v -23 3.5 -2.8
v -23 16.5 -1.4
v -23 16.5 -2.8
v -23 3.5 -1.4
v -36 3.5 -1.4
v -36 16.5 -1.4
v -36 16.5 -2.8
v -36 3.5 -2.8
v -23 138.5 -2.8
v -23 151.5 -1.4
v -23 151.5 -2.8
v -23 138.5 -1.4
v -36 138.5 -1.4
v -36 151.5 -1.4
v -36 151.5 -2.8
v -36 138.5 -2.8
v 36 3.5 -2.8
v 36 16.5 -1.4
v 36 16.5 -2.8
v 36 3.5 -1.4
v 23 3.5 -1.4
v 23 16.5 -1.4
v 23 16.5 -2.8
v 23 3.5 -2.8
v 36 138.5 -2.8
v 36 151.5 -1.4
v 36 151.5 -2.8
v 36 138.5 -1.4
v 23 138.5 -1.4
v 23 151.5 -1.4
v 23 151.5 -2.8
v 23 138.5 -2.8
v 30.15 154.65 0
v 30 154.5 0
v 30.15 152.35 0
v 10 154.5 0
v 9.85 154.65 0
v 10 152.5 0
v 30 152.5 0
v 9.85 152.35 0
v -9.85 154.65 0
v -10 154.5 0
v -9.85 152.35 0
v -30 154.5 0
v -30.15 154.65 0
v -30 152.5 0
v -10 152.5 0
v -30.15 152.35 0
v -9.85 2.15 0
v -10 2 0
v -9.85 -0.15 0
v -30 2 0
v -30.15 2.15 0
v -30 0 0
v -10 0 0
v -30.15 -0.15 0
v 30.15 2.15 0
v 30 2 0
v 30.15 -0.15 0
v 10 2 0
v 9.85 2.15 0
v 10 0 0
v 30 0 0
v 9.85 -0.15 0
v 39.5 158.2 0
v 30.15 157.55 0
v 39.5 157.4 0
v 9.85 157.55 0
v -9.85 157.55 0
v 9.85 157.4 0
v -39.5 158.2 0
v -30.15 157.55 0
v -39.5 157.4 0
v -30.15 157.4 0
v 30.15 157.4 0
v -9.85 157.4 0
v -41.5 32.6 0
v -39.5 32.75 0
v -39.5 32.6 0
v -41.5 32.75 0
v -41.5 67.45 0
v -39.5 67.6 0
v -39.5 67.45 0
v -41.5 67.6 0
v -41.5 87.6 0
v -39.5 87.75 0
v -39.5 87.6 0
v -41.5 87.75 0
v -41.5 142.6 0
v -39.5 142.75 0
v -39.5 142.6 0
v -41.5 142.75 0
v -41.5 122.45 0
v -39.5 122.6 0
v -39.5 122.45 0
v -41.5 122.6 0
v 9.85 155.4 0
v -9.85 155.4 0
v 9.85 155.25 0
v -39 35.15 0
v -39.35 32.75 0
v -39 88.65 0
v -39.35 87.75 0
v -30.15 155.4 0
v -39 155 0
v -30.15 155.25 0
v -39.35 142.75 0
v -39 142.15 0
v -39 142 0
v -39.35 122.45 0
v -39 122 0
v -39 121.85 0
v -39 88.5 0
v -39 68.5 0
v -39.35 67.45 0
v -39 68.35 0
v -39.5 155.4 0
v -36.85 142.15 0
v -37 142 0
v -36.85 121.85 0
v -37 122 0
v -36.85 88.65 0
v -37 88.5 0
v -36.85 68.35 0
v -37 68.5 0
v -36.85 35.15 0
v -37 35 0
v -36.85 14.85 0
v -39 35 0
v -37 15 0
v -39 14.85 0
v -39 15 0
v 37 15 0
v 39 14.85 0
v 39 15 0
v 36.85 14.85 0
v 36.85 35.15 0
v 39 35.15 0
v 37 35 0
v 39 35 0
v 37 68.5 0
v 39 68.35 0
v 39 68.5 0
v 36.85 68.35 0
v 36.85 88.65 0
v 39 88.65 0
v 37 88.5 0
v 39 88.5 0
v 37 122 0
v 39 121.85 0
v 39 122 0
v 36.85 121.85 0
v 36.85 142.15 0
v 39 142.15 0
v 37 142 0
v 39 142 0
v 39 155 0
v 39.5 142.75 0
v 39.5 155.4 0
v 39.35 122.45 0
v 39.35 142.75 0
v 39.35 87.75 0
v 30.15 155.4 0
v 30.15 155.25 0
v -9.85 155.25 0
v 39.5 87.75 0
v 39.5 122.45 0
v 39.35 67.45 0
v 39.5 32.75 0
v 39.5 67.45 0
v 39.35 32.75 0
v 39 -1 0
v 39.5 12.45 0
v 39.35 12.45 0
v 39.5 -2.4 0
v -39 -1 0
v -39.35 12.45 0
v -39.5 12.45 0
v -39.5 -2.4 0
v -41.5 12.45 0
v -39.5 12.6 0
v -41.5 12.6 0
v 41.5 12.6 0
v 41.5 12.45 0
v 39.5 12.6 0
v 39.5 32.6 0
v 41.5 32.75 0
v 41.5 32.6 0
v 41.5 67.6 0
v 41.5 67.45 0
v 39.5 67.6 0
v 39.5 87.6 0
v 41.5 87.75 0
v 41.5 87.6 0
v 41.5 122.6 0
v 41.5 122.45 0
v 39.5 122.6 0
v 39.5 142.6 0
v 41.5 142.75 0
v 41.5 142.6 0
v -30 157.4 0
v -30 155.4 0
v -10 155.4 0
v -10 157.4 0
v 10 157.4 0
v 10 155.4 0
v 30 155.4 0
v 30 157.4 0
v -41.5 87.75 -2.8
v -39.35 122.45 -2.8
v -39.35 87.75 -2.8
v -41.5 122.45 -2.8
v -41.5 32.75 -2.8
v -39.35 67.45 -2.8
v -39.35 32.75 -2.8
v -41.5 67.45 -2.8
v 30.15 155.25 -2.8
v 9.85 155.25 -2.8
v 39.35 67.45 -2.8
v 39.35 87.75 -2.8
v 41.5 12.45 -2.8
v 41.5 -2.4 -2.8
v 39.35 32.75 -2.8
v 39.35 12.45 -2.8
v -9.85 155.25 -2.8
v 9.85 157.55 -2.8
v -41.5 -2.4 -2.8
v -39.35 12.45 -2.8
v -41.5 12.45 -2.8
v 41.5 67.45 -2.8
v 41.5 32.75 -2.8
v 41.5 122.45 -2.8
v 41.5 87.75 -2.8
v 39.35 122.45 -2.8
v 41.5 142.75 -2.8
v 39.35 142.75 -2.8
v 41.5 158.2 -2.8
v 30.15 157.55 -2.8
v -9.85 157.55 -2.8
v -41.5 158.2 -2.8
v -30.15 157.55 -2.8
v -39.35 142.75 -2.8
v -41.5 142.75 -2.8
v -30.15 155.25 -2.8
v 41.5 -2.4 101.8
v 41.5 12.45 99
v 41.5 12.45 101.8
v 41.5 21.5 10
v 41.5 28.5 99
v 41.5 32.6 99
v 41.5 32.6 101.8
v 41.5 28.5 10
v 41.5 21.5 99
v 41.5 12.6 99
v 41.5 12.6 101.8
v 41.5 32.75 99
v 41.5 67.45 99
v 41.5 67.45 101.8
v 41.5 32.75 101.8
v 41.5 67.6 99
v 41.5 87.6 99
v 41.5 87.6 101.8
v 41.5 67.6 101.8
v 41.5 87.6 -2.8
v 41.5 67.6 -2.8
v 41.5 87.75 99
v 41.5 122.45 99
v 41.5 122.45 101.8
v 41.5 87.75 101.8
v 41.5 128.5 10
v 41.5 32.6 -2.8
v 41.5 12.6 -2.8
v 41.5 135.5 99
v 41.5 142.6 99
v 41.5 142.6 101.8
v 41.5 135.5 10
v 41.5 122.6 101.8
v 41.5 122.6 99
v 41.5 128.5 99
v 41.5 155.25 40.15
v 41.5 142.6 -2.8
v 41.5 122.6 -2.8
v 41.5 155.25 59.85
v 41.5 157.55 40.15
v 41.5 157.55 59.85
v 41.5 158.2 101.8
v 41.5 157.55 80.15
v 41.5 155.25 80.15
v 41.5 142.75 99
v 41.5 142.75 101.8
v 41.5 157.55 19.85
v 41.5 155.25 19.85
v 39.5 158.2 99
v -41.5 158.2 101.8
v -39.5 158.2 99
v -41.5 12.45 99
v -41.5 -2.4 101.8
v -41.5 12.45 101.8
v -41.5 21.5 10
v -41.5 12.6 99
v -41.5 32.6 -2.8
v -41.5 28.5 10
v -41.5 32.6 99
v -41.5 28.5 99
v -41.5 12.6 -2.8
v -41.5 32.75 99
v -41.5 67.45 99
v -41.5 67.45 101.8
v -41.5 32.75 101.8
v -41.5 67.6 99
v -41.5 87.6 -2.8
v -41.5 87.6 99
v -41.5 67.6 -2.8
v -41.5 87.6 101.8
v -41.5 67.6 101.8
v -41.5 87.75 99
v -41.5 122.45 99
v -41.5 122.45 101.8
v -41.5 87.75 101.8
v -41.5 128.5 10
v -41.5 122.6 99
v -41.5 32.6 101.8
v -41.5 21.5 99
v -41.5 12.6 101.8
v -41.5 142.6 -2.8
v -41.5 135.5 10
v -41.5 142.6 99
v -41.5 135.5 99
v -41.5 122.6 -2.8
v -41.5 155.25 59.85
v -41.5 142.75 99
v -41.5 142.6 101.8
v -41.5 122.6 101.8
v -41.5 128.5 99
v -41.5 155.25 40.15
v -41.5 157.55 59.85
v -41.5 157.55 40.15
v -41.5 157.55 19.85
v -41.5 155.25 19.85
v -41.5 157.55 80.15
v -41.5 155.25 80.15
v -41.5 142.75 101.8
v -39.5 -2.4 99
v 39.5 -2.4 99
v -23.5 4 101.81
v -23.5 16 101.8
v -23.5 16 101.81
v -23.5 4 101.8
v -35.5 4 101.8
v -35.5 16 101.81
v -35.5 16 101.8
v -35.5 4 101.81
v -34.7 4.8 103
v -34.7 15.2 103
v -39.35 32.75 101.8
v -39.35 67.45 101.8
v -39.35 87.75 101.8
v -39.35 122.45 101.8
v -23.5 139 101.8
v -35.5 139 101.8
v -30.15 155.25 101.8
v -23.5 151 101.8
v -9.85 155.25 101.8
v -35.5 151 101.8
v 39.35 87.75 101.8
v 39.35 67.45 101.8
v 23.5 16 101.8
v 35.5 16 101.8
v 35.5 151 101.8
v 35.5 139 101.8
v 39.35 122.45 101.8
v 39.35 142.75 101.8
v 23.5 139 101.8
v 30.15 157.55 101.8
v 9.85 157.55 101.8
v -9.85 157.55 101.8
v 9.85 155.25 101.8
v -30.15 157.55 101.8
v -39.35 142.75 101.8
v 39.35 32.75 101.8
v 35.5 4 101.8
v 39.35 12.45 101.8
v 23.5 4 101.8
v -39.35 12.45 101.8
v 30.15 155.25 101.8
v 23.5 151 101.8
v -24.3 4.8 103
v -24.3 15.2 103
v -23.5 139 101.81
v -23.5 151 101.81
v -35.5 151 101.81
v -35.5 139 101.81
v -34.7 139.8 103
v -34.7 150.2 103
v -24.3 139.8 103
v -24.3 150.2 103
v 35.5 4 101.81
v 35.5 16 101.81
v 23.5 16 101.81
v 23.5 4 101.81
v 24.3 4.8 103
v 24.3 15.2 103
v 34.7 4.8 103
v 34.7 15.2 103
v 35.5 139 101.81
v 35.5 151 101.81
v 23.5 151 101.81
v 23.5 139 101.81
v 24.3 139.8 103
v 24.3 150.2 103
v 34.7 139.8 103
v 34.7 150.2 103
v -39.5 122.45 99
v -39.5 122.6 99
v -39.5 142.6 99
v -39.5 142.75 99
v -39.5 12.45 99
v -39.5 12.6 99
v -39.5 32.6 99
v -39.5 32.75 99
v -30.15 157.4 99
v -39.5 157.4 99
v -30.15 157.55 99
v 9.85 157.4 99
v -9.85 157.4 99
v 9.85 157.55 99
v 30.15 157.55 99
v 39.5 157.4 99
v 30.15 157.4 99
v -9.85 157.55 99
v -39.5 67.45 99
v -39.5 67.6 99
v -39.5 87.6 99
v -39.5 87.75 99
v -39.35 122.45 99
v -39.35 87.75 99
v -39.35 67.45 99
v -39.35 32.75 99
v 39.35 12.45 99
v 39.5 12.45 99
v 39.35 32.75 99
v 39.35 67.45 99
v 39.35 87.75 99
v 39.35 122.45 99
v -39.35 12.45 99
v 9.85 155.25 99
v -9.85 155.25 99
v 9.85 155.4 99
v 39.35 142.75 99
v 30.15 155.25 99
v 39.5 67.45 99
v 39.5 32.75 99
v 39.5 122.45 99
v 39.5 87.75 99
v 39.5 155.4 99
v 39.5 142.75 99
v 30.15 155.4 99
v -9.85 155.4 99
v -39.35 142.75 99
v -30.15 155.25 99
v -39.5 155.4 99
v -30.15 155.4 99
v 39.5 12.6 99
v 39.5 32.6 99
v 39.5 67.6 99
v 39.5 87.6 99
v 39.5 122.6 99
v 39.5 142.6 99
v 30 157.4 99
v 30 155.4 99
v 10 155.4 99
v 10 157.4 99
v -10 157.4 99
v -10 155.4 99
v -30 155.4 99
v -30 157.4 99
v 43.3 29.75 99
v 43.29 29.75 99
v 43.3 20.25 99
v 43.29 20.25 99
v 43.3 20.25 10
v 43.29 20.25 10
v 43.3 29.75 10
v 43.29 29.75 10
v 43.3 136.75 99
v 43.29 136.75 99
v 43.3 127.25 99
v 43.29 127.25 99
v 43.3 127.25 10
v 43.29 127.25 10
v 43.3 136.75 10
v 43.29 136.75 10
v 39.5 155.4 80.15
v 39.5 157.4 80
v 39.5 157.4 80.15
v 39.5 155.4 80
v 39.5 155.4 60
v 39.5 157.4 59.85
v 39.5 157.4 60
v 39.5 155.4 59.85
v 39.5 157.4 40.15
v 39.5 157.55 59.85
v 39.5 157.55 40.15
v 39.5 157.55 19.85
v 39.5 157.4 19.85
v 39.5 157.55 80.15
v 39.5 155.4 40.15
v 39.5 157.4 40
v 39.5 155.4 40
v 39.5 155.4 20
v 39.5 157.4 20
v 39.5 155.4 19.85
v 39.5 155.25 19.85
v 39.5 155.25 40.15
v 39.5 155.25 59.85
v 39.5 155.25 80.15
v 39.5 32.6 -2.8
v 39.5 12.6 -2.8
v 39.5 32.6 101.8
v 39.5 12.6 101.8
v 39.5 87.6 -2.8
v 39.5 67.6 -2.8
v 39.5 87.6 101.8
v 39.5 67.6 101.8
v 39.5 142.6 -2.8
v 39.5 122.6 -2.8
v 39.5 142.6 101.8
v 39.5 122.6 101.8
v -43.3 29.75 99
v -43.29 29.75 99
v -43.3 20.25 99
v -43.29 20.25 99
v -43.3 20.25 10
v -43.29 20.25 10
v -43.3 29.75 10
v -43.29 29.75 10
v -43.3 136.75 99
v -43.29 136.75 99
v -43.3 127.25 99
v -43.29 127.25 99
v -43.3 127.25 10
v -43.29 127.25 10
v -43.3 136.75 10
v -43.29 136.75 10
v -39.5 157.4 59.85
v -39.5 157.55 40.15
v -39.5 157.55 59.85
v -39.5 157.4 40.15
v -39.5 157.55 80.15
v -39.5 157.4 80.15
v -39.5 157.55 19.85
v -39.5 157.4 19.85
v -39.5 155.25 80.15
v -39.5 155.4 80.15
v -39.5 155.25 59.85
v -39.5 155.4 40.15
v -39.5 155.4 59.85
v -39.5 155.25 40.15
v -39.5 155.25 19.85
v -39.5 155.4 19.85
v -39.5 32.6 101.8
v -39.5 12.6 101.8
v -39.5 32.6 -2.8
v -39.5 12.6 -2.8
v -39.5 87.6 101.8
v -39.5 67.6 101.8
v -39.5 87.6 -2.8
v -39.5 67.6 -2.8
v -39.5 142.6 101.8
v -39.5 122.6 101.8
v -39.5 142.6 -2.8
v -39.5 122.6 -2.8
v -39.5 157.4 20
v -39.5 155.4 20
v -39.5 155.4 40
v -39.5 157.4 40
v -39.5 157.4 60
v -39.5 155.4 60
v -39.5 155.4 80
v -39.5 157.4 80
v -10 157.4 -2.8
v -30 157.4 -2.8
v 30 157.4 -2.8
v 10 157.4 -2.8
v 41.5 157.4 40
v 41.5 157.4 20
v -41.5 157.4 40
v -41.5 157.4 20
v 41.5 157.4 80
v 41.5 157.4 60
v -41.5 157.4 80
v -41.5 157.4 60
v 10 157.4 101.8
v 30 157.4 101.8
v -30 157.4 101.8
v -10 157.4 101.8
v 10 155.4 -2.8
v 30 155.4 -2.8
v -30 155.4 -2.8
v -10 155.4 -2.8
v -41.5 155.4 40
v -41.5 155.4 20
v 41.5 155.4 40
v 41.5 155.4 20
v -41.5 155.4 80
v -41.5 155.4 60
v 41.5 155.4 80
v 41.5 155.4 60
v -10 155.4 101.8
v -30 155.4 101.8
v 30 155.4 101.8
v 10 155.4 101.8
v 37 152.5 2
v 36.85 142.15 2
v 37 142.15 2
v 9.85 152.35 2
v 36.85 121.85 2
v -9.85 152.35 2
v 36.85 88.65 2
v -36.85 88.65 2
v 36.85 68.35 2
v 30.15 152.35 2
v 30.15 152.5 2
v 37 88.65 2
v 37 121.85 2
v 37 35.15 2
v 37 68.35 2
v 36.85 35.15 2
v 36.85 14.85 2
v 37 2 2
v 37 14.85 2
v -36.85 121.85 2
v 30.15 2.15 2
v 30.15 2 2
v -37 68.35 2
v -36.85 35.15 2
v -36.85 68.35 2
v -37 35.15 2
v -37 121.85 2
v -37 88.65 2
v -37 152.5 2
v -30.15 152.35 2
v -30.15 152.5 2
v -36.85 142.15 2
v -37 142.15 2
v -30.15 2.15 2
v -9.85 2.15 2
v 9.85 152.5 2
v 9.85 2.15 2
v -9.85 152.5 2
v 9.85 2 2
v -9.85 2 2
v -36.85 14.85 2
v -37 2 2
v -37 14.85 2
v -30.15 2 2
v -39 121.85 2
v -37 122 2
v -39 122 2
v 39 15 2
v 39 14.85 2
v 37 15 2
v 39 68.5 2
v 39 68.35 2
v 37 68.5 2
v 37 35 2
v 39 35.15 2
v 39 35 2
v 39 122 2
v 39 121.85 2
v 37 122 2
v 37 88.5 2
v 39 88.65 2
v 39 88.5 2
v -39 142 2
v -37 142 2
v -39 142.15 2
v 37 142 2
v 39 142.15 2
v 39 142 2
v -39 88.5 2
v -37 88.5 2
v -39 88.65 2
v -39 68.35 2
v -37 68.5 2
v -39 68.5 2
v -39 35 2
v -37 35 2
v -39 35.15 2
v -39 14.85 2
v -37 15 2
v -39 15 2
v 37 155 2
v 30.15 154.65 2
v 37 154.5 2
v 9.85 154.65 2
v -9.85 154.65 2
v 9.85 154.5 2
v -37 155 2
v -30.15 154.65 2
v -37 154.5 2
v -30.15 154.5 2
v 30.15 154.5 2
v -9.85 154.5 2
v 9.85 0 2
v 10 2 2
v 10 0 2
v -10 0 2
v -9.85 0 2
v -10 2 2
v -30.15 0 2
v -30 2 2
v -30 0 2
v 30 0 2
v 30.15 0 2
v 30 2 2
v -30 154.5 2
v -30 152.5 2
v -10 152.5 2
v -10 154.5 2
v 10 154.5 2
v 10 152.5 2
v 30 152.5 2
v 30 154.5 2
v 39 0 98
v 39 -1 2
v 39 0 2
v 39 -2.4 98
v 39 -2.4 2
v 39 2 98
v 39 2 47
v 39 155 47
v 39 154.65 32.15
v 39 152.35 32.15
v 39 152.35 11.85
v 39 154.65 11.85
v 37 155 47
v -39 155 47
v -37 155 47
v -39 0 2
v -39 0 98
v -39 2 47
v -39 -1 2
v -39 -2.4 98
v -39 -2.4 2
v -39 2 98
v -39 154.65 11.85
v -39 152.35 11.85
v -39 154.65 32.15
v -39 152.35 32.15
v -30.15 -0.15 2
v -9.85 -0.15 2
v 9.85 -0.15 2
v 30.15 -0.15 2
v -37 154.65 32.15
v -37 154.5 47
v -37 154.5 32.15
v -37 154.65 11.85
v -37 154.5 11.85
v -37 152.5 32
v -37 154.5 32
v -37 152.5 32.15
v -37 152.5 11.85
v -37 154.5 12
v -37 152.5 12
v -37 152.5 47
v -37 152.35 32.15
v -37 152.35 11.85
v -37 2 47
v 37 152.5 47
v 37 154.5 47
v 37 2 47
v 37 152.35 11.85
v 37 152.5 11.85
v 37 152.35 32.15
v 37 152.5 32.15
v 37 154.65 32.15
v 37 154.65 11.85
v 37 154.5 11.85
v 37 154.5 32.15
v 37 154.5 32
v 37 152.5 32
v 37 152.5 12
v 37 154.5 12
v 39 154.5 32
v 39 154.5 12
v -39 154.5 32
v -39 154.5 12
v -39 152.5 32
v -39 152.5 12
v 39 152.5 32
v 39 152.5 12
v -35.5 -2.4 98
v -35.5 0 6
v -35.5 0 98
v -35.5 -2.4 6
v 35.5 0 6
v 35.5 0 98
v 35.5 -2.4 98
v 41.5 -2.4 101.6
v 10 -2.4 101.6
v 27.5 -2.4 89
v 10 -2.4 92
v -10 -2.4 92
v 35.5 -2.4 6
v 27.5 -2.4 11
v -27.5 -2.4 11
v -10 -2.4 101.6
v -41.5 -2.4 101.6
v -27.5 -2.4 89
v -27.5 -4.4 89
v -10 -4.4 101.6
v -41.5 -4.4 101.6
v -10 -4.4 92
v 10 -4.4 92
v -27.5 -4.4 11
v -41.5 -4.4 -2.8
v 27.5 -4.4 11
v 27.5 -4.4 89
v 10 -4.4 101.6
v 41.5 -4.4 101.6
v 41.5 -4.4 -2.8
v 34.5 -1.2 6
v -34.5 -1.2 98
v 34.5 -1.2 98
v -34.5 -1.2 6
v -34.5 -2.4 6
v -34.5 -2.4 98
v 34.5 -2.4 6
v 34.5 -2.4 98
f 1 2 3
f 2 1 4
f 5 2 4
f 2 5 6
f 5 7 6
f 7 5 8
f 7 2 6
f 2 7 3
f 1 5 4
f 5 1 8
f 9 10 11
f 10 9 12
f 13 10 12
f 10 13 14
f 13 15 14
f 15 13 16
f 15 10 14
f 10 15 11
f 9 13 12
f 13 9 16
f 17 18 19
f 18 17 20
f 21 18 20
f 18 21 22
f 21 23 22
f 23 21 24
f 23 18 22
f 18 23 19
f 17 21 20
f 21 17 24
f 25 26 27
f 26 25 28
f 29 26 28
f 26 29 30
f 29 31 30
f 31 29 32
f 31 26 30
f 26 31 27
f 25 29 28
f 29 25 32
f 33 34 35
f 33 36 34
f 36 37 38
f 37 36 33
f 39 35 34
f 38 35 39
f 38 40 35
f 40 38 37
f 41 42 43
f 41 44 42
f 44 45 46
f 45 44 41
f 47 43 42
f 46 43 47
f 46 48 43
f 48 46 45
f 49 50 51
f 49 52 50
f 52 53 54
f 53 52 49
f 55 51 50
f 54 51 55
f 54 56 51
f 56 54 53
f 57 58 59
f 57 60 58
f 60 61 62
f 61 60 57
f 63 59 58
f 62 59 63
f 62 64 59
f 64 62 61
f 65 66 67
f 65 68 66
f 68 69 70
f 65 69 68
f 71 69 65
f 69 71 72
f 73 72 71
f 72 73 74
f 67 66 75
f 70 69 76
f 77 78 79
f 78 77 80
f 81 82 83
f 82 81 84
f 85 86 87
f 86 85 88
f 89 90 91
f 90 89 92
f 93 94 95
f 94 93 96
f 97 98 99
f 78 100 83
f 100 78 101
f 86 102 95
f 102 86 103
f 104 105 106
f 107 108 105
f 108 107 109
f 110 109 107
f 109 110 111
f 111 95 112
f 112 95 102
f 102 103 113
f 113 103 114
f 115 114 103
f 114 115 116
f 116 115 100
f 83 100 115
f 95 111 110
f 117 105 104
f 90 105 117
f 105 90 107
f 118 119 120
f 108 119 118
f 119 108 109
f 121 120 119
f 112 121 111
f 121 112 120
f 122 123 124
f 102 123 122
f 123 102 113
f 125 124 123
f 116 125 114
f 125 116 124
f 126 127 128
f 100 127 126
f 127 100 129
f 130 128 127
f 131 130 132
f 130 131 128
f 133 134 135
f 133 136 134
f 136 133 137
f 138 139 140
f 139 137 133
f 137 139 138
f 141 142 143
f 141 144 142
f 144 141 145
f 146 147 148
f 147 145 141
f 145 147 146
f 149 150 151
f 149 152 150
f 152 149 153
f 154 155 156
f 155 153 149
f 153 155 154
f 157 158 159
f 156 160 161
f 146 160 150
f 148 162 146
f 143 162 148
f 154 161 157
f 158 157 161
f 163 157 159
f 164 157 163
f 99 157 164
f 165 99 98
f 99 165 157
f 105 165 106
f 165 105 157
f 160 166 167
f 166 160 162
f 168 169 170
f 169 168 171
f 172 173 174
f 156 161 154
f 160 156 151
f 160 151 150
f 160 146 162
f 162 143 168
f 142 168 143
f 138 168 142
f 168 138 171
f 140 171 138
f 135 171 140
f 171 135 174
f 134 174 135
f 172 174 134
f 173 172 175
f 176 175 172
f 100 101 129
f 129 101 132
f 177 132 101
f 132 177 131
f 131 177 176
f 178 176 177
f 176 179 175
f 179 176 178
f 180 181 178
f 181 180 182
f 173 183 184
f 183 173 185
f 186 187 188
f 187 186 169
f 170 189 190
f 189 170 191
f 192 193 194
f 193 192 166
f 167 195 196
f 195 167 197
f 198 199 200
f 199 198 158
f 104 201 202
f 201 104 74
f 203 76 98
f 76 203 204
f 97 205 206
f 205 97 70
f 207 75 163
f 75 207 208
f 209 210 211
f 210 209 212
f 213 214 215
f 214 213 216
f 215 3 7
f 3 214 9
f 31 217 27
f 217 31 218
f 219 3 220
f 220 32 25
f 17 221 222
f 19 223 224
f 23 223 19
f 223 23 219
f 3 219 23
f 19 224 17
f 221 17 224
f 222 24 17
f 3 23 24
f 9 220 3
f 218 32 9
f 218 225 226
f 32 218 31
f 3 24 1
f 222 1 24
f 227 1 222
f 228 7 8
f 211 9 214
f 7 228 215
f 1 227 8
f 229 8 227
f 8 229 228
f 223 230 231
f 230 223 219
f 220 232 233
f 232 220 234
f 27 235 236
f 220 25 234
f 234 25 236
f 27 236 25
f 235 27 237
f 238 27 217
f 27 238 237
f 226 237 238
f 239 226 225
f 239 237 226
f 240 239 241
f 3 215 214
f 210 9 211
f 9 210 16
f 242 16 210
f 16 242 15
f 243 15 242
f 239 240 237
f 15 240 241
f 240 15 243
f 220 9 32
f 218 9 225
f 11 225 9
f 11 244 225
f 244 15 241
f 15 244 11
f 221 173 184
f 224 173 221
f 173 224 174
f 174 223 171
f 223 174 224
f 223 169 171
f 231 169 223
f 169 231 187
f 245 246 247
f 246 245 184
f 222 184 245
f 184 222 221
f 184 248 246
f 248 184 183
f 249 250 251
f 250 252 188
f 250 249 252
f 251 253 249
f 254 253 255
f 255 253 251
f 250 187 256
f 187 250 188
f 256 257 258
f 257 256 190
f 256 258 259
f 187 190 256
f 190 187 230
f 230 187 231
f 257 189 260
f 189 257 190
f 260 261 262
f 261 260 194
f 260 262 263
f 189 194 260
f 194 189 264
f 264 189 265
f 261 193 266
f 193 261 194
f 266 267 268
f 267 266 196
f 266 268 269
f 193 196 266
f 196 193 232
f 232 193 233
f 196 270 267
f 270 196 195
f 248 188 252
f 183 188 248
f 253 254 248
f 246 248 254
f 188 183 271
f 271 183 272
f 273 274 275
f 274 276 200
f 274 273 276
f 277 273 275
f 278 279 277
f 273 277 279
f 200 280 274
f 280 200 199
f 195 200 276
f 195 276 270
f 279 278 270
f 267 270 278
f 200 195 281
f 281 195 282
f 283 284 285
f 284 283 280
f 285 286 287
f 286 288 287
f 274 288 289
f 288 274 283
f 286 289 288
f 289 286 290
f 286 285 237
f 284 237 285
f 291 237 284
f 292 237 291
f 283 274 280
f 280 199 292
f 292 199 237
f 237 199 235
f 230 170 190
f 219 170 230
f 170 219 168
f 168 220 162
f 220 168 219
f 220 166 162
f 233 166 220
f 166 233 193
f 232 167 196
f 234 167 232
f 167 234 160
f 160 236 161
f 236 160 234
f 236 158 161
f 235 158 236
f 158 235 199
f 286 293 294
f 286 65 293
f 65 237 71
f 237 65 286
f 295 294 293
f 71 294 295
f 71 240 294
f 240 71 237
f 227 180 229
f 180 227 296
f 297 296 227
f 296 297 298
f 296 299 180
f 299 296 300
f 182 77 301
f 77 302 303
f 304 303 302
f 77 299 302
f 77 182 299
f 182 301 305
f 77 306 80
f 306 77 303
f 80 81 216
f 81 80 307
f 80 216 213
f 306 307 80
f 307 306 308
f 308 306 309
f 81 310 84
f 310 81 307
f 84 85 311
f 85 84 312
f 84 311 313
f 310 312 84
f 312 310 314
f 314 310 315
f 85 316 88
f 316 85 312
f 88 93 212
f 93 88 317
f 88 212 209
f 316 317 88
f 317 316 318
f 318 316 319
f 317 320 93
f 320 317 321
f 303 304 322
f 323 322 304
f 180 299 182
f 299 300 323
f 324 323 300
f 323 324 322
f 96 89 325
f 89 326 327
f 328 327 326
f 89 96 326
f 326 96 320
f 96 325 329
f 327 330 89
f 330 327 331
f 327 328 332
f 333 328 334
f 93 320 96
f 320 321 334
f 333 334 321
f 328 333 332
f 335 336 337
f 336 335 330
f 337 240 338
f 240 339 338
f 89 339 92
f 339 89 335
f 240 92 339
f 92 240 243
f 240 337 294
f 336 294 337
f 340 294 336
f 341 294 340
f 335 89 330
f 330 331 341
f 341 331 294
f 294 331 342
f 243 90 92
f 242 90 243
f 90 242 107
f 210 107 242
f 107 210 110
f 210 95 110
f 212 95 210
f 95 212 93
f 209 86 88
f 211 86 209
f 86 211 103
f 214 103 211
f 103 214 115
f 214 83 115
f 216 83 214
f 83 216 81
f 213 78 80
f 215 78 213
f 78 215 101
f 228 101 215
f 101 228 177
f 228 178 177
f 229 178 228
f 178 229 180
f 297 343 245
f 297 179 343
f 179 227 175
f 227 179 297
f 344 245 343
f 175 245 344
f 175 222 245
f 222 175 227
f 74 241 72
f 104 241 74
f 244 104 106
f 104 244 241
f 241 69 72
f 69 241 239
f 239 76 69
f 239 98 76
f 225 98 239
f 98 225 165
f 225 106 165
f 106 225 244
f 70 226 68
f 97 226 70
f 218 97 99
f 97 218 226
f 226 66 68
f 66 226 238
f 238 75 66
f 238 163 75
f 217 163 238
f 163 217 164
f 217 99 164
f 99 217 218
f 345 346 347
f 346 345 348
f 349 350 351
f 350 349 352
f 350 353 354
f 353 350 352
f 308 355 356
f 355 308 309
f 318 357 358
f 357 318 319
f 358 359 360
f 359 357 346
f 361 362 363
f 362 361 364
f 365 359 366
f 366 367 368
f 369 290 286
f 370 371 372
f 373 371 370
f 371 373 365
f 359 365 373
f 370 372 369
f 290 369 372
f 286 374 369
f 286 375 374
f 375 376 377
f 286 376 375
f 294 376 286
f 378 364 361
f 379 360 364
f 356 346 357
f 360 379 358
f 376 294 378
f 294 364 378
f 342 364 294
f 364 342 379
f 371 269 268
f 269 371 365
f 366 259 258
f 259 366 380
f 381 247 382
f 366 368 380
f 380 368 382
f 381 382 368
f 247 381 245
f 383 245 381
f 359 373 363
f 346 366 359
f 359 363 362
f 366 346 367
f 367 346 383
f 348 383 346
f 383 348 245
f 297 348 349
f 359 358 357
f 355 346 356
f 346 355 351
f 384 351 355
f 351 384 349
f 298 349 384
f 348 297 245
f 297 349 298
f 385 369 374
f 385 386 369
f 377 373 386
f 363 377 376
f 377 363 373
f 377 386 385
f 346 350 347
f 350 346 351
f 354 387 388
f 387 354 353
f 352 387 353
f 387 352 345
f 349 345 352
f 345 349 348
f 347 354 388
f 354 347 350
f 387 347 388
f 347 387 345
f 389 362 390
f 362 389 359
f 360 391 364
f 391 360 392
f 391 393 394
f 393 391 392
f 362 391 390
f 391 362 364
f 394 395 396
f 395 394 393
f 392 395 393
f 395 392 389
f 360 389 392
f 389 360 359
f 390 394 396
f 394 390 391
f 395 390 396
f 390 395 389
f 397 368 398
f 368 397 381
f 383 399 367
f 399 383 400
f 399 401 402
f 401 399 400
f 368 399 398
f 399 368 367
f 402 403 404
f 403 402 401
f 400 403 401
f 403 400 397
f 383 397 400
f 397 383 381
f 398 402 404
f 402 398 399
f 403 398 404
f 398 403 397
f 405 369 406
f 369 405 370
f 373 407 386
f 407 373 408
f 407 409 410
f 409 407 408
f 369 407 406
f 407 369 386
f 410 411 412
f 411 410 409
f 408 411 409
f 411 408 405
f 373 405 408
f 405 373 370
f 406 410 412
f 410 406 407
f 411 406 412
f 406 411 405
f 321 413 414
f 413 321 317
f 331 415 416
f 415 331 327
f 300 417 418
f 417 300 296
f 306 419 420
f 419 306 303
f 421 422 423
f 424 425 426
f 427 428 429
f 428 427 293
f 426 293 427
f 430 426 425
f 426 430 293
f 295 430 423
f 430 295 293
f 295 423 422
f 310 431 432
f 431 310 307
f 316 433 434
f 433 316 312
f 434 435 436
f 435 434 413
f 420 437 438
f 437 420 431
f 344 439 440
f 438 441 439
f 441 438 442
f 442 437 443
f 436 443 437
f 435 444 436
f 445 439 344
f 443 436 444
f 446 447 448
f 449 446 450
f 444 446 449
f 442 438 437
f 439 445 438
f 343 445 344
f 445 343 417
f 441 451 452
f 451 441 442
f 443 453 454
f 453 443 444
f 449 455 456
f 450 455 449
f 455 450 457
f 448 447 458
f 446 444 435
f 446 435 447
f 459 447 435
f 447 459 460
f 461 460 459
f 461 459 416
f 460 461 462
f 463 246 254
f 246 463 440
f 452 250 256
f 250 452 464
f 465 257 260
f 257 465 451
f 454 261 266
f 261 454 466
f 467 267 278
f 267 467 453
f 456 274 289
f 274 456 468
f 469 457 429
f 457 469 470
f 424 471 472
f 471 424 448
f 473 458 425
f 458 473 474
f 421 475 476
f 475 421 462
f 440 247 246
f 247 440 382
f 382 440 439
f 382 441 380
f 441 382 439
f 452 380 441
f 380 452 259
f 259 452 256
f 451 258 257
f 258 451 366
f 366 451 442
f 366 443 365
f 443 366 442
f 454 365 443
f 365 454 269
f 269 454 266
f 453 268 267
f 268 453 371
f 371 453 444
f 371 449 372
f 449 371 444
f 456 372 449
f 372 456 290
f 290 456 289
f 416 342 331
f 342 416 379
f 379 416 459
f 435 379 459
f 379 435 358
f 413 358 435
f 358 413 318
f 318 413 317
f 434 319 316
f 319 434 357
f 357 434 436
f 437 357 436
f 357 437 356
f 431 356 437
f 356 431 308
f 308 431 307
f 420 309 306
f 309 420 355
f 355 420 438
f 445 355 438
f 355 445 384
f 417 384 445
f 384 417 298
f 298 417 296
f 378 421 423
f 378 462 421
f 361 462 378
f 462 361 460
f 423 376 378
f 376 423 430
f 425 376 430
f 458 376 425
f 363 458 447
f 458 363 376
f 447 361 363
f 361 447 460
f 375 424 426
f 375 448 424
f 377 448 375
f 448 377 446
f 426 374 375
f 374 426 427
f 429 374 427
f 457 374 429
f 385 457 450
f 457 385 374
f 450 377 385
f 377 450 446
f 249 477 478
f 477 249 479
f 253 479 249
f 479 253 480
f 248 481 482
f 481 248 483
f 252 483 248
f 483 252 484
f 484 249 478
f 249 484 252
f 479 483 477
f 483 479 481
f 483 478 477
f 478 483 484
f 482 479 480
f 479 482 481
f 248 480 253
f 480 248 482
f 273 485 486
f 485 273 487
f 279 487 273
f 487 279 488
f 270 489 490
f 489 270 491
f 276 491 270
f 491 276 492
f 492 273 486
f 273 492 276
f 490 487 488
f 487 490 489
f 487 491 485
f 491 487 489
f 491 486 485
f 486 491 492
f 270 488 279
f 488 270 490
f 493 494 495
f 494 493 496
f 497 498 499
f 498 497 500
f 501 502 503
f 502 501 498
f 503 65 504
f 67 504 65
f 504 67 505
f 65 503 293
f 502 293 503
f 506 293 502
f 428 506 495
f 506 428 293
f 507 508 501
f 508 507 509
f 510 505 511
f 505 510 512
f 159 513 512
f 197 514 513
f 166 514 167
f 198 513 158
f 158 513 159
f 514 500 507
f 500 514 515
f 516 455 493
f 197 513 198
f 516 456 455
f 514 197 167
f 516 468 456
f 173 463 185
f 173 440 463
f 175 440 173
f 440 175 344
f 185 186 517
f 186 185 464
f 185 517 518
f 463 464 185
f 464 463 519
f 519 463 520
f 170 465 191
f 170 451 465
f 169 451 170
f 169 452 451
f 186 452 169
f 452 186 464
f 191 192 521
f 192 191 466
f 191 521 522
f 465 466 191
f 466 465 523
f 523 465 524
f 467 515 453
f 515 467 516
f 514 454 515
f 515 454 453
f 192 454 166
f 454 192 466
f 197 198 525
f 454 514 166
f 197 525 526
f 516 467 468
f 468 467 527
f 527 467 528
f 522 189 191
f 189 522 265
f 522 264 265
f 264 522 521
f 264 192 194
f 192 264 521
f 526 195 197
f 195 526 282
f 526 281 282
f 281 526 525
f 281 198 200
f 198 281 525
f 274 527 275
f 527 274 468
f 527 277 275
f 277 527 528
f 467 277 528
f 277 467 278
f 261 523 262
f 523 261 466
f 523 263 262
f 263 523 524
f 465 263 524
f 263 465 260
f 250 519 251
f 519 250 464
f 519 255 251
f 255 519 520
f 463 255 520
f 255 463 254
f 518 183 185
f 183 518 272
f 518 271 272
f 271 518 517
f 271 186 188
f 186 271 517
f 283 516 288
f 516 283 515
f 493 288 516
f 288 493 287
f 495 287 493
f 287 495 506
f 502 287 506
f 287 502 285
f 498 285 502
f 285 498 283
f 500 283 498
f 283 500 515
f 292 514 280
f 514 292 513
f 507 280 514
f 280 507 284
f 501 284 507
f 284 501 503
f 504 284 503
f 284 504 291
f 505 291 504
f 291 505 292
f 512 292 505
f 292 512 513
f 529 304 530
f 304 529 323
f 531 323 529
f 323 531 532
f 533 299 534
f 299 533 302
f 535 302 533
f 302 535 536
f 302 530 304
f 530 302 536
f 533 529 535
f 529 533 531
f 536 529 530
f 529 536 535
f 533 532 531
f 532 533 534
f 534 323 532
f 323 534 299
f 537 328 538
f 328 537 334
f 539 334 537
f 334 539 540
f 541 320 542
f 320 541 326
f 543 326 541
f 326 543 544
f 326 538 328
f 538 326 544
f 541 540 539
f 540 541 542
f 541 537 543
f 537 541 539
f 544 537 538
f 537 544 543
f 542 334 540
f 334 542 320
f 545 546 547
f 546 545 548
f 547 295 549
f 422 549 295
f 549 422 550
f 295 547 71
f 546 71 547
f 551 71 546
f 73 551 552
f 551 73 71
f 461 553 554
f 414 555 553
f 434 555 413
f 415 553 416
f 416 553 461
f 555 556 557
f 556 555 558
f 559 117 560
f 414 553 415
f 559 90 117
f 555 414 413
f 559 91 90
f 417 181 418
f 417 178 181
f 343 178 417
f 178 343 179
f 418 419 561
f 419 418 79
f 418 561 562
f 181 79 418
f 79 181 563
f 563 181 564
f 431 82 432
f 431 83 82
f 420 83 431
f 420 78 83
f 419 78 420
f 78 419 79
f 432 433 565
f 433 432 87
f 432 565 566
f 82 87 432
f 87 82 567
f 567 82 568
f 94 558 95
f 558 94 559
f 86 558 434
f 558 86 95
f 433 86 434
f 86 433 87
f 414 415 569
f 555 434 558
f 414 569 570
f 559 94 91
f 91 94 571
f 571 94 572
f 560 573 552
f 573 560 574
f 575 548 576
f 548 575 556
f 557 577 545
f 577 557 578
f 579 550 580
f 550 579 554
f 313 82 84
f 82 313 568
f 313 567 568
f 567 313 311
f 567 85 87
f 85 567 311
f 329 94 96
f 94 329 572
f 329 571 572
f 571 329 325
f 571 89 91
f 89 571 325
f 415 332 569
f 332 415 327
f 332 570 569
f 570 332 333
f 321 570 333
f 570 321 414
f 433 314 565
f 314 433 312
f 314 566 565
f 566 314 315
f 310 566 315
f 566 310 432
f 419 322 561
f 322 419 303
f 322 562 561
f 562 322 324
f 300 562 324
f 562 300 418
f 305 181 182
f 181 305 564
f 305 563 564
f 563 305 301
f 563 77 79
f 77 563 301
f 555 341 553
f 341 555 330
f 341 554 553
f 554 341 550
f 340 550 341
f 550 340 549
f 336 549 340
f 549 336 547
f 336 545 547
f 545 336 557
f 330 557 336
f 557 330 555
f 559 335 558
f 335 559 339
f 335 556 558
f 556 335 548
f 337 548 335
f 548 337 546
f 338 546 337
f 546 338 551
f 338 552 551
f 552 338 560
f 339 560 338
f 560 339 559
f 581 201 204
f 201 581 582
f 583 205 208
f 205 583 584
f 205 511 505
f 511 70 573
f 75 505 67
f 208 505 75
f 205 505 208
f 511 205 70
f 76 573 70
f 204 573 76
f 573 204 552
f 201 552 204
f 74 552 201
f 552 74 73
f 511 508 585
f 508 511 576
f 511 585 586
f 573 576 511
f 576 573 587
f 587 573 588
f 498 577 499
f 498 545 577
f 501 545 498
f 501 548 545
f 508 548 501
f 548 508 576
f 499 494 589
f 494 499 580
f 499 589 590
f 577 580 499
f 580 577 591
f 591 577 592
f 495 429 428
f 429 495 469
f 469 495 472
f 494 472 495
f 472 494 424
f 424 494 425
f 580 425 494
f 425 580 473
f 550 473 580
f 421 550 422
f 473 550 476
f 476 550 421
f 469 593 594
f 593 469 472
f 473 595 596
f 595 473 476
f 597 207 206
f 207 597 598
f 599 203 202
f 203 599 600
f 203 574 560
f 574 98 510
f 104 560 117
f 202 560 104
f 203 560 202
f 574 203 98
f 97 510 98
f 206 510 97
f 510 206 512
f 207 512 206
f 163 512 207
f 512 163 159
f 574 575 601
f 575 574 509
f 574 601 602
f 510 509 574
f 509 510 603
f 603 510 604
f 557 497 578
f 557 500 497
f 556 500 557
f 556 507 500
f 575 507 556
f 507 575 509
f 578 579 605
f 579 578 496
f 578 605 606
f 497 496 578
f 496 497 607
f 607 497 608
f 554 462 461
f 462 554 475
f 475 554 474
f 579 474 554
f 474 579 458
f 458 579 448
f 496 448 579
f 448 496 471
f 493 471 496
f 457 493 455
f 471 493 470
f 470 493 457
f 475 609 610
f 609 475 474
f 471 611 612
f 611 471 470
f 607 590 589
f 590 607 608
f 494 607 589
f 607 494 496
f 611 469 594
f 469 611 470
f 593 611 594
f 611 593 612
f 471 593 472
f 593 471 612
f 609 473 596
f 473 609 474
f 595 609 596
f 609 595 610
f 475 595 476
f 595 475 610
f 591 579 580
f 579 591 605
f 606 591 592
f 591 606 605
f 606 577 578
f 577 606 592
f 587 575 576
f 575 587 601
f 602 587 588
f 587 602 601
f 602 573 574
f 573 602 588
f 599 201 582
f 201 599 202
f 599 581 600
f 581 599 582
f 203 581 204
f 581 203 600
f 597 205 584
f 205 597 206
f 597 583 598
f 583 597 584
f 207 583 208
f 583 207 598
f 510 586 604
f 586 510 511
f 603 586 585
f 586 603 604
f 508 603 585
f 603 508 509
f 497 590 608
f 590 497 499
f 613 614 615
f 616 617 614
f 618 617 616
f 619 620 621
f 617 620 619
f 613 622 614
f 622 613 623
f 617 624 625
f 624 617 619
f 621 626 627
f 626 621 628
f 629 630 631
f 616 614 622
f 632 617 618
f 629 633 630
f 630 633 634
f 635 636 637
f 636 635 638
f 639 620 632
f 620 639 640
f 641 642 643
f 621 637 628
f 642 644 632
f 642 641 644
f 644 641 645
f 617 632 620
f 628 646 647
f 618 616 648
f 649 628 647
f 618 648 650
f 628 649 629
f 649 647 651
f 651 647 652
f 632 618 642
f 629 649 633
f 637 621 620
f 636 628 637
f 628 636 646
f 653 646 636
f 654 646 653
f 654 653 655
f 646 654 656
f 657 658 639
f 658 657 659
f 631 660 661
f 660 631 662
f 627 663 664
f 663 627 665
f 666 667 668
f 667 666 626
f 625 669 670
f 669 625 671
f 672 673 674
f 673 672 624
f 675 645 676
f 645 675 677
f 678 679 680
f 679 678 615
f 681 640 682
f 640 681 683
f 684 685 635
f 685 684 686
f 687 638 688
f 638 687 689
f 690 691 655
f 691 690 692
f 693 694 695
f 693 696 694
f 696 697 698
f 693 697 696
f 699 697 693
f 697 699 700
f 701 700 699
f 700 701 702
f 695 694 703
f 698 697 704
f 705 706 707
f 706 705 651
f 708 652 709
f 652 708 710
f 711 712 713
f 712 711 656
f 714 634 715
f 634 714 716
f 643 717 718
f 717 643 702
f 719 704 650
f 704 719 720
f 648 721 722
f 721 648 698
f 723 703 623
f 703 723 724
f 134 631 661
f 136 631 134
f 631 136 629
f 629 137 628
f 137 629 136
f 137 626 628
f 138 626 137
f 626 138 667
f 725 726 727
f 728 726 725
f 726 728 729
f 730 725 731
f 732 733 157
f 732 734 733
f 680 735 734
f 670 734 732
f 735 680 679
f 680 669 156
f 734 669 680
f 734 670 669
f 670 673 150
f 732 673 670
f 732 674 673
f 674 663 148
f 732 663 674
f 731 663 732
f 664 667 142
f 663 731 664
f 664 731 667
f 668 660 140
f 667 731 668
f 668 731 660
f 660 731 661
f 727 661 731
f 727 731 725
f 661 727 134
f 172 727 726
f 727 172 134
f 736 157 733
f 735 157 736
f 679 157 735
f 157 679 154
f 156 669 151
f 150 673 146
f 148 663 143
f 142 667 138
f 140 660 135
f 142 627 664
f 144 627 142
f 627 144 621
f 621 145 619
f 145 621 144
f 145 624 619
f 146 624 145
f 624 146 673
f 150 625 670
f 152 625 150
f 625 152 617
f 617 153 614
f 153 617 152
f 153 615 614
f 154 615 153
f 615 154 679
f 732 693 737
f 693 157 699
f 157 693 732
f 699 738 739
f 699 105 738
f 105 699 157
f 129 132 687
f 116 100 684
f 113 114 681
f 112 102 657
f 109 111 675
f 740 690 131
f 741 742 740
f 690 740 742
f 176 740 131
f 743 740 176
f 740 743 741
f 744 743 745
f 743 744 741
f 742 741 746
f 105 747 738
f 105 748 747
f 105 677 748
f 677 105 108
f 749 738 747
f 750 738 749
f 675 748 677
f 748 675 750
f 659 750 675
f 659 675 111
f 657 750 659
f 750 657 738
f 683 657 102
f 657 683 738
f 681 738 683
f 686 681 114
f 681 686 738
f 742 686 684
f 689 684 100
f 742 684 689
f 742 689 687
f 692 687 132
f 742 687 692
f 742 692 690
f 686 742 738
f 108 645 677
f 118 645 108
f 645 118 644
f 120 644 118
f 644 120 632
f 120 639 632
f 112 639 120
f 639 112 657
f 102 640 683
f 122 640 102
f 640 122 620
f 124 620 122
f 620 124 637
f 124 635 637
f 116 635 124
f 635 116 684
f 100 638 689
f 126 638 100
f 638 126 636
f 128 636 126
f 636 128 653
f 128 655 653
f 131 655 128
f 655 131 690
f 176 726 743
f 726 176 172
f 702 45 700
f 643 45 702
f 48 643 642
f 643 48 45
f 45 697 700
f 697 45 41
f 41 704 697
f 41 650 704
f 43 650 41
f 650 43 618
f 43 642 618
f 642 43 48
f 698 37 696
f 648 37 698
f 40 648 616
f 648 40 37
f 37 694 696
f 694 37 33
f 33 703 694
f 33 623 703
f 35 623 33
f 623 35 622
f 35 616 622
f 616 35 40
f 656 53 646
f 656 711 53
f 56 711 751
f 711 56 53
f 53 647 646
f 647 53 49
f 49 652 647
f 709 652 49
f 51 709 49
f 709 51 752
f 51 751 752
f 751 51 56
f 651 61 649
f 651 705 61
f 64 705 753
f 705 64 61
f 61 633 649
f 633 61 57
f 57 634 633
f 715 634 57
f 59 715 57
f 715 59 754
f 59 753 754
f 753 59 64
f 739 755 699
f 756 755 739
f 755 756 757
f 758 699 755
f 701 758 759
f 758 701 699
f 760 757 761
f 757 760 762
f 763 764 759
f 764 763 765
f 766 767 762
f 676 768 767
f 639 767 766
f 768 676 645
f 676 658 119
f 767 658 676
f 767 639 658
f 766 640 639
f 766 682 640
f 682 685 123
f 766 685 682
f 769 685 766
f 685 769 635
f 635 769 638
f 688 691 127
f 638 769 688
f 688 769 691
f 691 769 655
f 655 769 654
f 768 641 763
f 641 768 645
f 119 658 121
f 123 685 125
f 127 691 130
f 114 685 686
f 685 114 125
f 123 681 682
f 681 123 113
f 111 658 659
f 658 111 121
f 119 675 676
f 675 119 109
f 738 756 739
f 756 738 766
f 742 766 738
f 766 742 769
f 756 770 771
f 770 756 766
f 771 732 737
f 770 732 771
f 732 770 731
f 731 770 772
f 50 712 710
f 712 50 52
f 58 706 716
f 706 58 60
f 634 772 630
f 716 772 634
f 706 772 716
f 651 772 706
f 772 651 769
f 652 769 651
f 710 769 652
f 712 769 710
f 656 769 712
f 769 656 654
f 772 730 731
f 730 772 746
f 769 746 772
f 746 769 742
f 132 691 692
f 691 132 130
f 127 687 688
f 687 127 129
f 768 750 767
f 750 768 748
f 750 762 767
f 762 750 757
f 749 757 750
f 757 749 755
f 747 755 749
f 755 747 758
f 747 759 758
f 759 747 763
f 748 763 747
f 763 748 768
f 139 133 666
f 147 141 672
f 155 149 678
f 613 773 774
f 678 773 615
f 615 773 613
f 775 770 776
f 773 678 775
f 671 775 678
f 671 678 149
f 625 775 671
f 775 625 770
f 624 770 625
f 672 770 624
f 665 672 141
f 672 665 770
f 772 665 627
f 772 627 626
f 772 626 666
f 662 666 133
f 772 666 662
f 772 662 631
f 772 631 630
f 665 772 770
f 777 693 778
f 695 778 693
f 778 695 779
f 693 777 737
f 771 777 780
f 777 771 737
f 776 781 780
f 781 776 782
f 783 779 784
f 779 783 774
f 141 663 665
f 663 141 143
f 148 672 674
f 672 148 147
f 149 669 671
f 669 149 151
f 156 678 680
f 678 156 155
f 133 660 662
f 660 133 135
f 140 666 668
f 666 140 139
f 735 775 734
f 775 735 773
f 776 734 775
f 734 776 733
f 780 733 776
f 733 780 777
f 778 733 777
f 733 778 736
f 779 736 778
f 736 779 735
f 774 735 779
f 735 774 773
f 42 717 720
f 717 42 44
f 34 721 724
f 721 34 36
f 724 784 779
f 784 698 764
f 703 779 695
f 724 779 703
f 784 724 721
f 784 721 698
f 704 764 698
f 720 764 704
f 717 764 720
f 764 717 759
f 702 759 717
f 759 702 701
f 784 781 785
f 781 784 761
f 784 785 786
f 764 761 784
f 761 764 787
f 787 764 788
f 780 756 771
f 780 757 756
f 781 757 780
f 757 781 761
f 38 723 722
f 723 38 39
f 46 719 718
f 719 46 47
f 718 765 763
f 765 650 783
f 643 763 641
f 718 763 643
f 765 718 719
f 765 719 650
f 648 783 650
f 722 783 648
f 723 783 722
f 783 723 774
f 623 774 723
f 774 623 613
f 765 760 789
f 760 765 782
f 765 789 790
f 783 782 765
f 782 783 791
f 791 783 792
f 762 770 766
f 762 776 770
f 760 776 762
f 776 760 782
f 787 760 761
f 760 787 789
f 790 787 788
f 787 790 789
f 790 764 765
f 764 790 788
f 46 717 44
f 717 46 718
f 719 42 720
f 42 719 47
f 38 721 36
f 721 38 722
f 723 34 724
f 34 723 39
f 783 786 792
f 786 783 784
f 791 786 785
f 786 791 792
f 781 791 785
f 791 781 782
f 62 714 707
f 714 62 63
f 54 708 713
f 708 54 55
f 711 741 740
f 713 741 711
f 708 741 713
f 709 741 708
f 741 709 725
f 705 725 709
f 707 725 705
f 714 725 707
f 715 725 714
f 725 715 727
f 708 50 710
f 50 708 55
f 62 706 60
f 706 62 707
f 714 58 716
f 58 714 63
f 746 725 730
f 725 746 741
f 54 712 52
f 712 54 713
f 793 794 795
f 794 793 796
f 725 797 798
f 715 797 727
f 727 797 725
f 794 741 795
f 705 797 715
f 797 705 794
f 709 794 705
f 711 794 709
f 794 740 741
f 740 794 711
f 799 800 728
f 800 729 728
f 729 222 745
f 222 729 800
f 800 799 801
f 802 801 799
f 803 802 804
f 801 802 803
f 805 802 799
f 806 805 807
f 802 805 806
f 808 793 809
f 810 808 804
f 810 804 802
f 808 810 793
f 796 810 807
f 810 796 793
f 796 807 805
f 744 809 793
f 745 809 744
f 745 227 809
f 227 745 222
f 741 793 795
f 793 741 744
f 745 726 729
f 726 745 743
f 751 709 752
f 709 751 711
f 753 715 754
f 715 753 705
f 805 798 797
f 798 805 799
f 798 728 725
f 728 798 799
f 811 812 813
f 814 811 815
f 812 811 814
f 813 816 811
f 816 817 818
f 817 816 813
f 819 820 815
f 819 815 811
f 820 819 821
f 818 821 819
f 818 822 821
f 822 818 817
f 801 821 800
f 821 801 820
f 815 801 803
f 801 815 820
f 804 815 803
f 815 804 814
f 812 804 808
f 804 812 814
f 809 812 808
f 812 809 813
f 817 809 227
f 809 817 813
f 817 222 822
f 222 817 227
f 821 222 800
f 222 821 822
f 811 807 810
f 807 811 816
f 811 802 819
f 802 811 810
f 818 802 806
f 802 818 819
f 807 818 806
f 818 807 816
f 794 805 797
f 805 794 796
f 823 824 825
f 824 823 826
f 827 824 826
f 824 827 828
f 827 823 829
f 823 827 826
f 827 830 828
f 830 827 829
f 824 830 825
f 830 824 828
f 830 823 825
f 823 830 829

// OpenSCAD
/*
 * Pokemon card drawer cabinet for the Bambu Lab A1 mini (180x180x180 mm).
 *
 * Every part is a flat plate printed lying on the build plate, so the
 * surfaces that touch cards get the build-plate finish (no layer ridges).
 * Plates join with friction-fit tabs and slots; the only glued joint is
 * the display frame onto the drawer's inner front plate.
 *
 * Units: mm.  Cards: 63x88 raw; the pocket clears double-sleeved cards
 * (about 70x95).
 *
 * Select the part to export with -D 'part="..."' (see Makefile), or set
 * `part` below.  "assembly" shows everything put together for preview.
 */

/* [Part selection] */
// assembly | drawer_bottom | drawer_side_left | drawer_side_right | drawer_back | drawer_front_inner | drawer_front_frame | window_pane | case_bottom | case_top | case_side_left | case_side_right | case_back | clip | follower | coupon_slot | coupon_tab | coupon_rail
part = "assembly";
// assembly preview only: how far the drawer is pulled out
pull = 0;

/* [Fit] */
// tab-to-slot clearance per side; print the coupons first to tune
fit = 0.15;
// drawer-to-case sliding clearance per side
slide = 0.5;

/* [Plates] */
// wall plate thickness
t = 2.0;
// case top/bottom plate thickness
tb = 2.8;

/* [Card space] */
// drawer inner width; double-sleeved cards (~70) plus finger room
pocket_w = 74;
// headroom above the drawer floor; double-sleeved height (~95) plus play
card_space = 96;
// length of the card row (sets capacity)
row_len = 150.5;
// drawer side/back wall height
wall_h = 45;

/* [Display pocket] */
// slot depth for pane + label card
disp_gap = 2.4;
pane_t = 1.2;
pane_w = 69;
pane_h = 92;
// window cutout in the frame
win_w = 55;
win_h = 78;
rib_w = 3.5;
// finger notch in the frame top edge
notch_w = 20;
notch_d = 9.6;

/* [Tabs] */
tab_l = 20;

/* [Stacking] */
nub = 12;
nub_h = 1.2;
rec_d = 1.4;

/* [Rails and clips] */
rail_base = 7;
rail_top = 9.5;
rail_h = 1.8;
rail_z0 = 10;
clip_leg = 42;
clip_bridge = 8;

/* [Hidden] */
// ---- derived: drawer ----
dbw = pocket_w + 2 * t;        // drawer bottom width (78)
dbl = row_len + 2 * t + 1.5;   // drawer bottom length (156): 1 front lip + 0.5 rear margin
side_y0 = 3;                   // drawer-local y where the side walls start
side_len = dbl - side_y0;      // 153
back_c = side_y0 + row_len + t / 2;   // back wall center y (154.5)
// ---- derived: case ----
ciw = dbw + 2 * slide;         // case inner width (79)
cow = ciw + 2 * t;             // case outer width (83)
cih = t + card_space + 1;      // case inner height (99)
coh = cih + 2 * tb;            // case outer height (104.6)
case_front = -disp_gap;        // global y of the case front edge (-2.4)
back_face = dbl - 1 + 0.4;     // global y of the case back wall inner face (155.4)
csl = back_face + t + 0.8 - case_front;  // case plate/side length (160.6)
back_lc = back_face + t / 2 - case_front; // back wall slot center, case-local (158.8)
side_tab_x = [25, 80, 135];    // case side tab centers, case-local
nub_x = 29.5;                  // nub center offset from case midline
nub_y = [12.4, 147.4];         // nub centers, case-local
rail_x = [27.4, 134.4];        // rail centers, case-local
clip_t = 2 * rail_h - 0.3;     // clip thickness: inter-case gap minus play (3.3)
fw = cow;                      // frame width
fh = coh - 0.2;                // frame height, shy so stacked frames don't bind

// ---- helpers ----

// slot for a tab of length l running along Y, wall thickness w
module slot_v(cx, cy, w = t, l = tab_l) {
    translate([cx - w / 2 - fit, cy - l / 2 - fit])
        square([w + 2 * fit, l + 2 * fit]);
}

// slot for a tab of length l running along X
module slot_h(cx, cy, l = tab_l, w = t) {
    translate([cx - l / 2 - fit, cy - w / 2 - fit])
        square([l + 2 * fit, w + 2 * fit]);
}

// tapered stacking nub, centered at origin, rising from z=0
module stack_nub() {
    hull() {
        translate([-nub / 2, -nub / 2, 0]) cube([nub, nub, 0.01]);
        translate([-(nub - 1.6) / 2, -(nub - 1.6) / 2, nub_h - 0.01])
            cube([nub - 1.6, nub - 1.6, 0.01]);
    }
}

// dovetail rail on a case side, base on z=zb, centered on x=xc
module rail(xc, zb) {
    hull() {
        translate([xc - rail_base / 2, rail_z0, zb])
            cube([rail_base, cih - rail_z0, 0.01]);
        translate([xc - rail_top / 2, rail_z0, zb + rail_h - 0.01])
            cube([rail_top, cih - rail_z0, 0.01]);
    }
}

// ---- drawer parts (modeled in print orientation, card-facing side at z=0) ----

module drawer_bottom() {
    linear_extrude(t) difference() {
        translate([-dbw / 2, 0]) square([dbw, dbl]);
        for (sx = [-1, 1], yc = [26, 79.5, 133])
            slot_v(sx * (pocket_w + t) / 2, yc);
        for (sx = [-1, 1]) slot_h(sx * 20, back_c);
        for (sx = [-1, 1]) slot_h(sx * 20, 2);
    }
}

// left side as printed; the right side is its mirror
module drawer_side() {
    linear_extrude(t) difference() {
        union() {
            square([side_len, wall_h]);
            for (xc = [23, 76.5, 130])
                translate([xc - tab_l / 2, -t]) square([tab_l, t]);
        }
        // slot for the back wall's side tab
        translate([back_c - side_y0 - t / 2 - fit, 20 - tab_l / 2 - fit])
            square([t + 2 * fit, tab_l + 2 * fit]);
    }
}

module drawer_back() {
    linear_extrude(t) union() {
        translate([-pocket_w / 2, 0]) square([pocket_w, wall_h]);
        for (sx = [-1, 1])
            translate([sx * 20 - tab_l / 2, -t]) square([tab_l, t]);
        for (sx = [-1, 1])
            translate([sx == 1 ? pocket_w / 2 : -pocket_w / 2 - t, 20 - tab_l / 2])
                square([t, tab_l]);
    }
}

module drawer_front_inner() {
    linear_extrude(t) union() {
        translate([-dbw / 2, 0]) square([dbw, card_space]);
        for (sx = [-1, 1])
            translate([sx * 20 - tab_l / 2, -t]) square([tab_l, t]);
    }
}

// display frame, printed face down; ribs rise toward the viewer's back side
module drawer_front_frame() {
    linear_extrude(t) difference() {
        translate([-fw / 2, 0]) square([fw, fh]);
        // window; card sits at y 8.8..96.8 behind it
        translate([-win_w / 2, 13.8]) square([win_w, win_h]);
        translate([-notch_w / 2, fh - notch_d]) square([notch_w, notch_d + 1]);
    }
    // ribs land on the inner front plate (width dbw, from the floor up)
    for (sx = [-1, 1])
        translate([sx == 1 ? dbw / 2 - rib_w : -dbw / 2, tb + t, t])
            cube([rib_w, card_space, disp_gap]);
    translate([-(dbw / 2 - rib_w), tb + t, t])
        cube([dbw - 2 * rib_w, 4, disp_gap]);
}

module window_pane() {
    translate([-pane_w / 2, 0]) cube([pane_w, pane_h, pane_t]);
}

// ---- case parts ----

module case_plate_2d() {
    difference() {
        translate([-cow / 2, 0]) square([cow, csl]);
        for (sx = [-1, 1], yc = side_tab_x)
            slot_v(sx * (ciw + t) / 2, yc);
        for (sx = [-1, 1]) slot_h(sx * 20, back_lc);
    }
}

// printed with the drawer-facing side down (z=0)
module case_bottom() {
    difference() {
        linear_extrude(tb) case_plate_2d();
        // stacking recesses, on the underside in use
        for (sx = [-1, 1], yc = nub_y)
            translate([sx * nub_x - (nub + 1) / 2, yc - (nub + 1) / 2, tb - rec_d])
                cube([nub + 1, nub + 1, rec_d + 1]);
    }
}

module case_top() {
    linear_extrude(tb) case_plate_2d();
    for (sx = [-1, 1], yc = nub_y)
        translate([sx * nub_x, yc, tb]) stack_nub();
}

// left side as printed, exterior face (rails) up; right is its mirror
module case_side() {
    linear_extrude(t) difference() {
        union() {
            square([csl, cih]);
            for (xc = side_tab_x) {
                translate([xc - tab_l / 2, -tb]) square([tab_l, tb]);
                translate([xc - tab_l / 2, cih]) square([tab_l, tb]);
            }
        }
        for (yc = [30, 70])
            translate([back_lc - t / 2 - fit, yc - tab_l / 2 - fit])
                square([t + 2 * fit, tab_l + 2 * fit]);
    }
    for (xc = rail_x) rail(xc, t);
}

module case_back() {
    linear_extrude(t) union() {
        translate([-ciw / 2, 0]) square([ciw, cih]);
        for (sx = [-1, 1]) {
            translate([sx * 20 - tab_l / 2, -tb]) square([tab_l, tb]);
            translate([sx * 20 - tab_l / 2, cih]) square([tab_l, tb]);
        }
        for (sx = [-1, 1], yc = [30, 70])
            translate([sx == 1 ? ciw / 2 : -ciw / 2 - t, yc - tab_l / 2])
                square([t, tab_l]);
    }
}

// ---- connectors ----

// staple clip joining two adjacent cases; slides down over a rail pair.
// Printed flat; X = leg length, Y = across the rails, Z = thickness.
module clip_half() {
    mid = clip_t / 2;
    inner0 = rail_base / 2 + 0.25 + fit;   // leg mouth at the case walls
    inner1 = rail_top / 2 + 0.25;          // leg waist at the gap middle
    outer = rail_top / 2 + 6;
    for (seg = [[0, inner0, mid, inner1], [mid, inner1, clip_t, inner0]])
        hull() {
            translate([0, seg[1], seg[0]]) cube([clip_leg, outer - seg[1], 0.01]);
            translate([0, seg[3], seg[2] - 0.01]) cube([clip_leg, outer - seg[3], 0.01]);
        }
}

module clip() {
    outer = rail_top / 2 + 6;
    clip_half();
    mirror([0, 1, 0]) clip_half();
    translate([clip_leg, -outer, 0]) cube([clip_bridge, 2 * outer, clip_t]);
}

// L-shaped follower to keep a part-filled drawer's cards upright
module follower() {
    cube([pocket_w - 1, 80, t]);
    cube([pocket_w - 1, t, 28]);
}

// ---- fit-test coupons ----

module coupon_slot() {
    linear_extrude(t) difference() {
        translate([-20, -12]) square([40, 24]);
        slot_h(0, 0);
    }
}

module coupon_tab() {
    linear_extrude(t) union() {
        translate([-12, 0]) square([24, 14]);
        translate([-tab_l / 2, -t]) square([tab_l, t]);
    }
}

// print two, hold them rail-to-rail, and try the clip over the pair
module coupon_rail() {
    cube([24, 40, t]);
    hull() {
        translate([12 - rail_base / 2, 5, t]) cube([rail_base, 30, 0.01]);
        translate([12 - rail_top / 2, 5, t + rail_h - 0.01]) cube([rail_top, 30, 0.01]);
    }
}

// ---- assembly preview ----

module drawer_assembly() {
    color("lightsteelblue") {
        // bottom: card face up at z=t, local y - 1 = global y
        translate([0, -1, t]) mirror([0, 0, 1]) drawer_bottom();
        // left side: interior face at x=-pocket_w/2
        translate([-pocket_w / 2, side_y0 - 1, t])
            rotate([90, 0, 90]) mirror([0, 0, 1]) drawer_side();
        // right side
        mirror([1, 0, 0]) translate([-pocket_w / 2, side_y0 - 1, t])
            rotate([90, 0, 90]) mirror([0, 0, 1]) drawer_side();
        // back wall, interior face toward the front
        translate([0, back_c - 1 + t / 2, t]) rotate([90, 0, 0]) drawer_back();
        // inner front plate, interior face toward the back
        translate([0, 0, t]) rotate([90, 0, 0]) mirror([0, 0, 1]) drawer_front_inner();
    }
    color("white")
        translate([0, -disp_gap - t, -tb]) mirror([0, 0, 1]) rotate([-90, 0, 0])
            drawer_front_frame();
    color("lightcyan", 0.5)
        translate([0, -disp_gap, t + 4]) rotate([90, 0, 0]) mirror([0, 0, 1])
            window_pane();
}

module case_assembly() {
    color("gainsboro") {
        translate([0, case_front, 0]) mirror([0, 0, 1]) case_bottom();
        translate([0, case_front, cih]) case_top();
        // right side, interior at x=ciw/2, rails outward
        translate([ciw / 2, case_front, 0]) rotate([90, 0, 90]) case_side();
        mirror([1, 0, 0]) translate([ciw / 2, case_front, 0])
            rotate([90, 0, 90]) case_side();
        translate([0, back_face + t, 0]) rotate([90, 0, 0]) case_back();
    }
}

module assembly() {
    case_assembly();
    translate([0, pull, 0]) drawer_assembly();
}

// ---- part selection ----

if (part == "assembly") assembly();
else if (part == "drawer_bottom") drawer_bottom();
else if (part == "drawer_side_left") mirror([1, 0, 0]) drawer_side();
else if (part == "drawer_side_right") drawer_side();
else if (part == "drawer_back") drawer_back();
else if (part == "drawer_front_inner") drawer_front_inner();
else if (part == "drawer_front_frame") drawer_front_frame();
else if (part == "window_pane") window_pane();
else if (part == "case_bottom") case_bottom();
else if (part == "case_top") case_top();
else if (part == "case_side_left") mirror([1, 0, 0]) case_side();
else if (part == "case_side_right") case_side();
else if (part == "case_back") case_back();
else if (part == "clip") clip();
else if (part == "follower") follower();
else if (part == "coupon_slot") coupon_slot();
else if (part == "coupon_tab") coupon_tab();
else if (part == "coupon_rail") coupon_rail();
